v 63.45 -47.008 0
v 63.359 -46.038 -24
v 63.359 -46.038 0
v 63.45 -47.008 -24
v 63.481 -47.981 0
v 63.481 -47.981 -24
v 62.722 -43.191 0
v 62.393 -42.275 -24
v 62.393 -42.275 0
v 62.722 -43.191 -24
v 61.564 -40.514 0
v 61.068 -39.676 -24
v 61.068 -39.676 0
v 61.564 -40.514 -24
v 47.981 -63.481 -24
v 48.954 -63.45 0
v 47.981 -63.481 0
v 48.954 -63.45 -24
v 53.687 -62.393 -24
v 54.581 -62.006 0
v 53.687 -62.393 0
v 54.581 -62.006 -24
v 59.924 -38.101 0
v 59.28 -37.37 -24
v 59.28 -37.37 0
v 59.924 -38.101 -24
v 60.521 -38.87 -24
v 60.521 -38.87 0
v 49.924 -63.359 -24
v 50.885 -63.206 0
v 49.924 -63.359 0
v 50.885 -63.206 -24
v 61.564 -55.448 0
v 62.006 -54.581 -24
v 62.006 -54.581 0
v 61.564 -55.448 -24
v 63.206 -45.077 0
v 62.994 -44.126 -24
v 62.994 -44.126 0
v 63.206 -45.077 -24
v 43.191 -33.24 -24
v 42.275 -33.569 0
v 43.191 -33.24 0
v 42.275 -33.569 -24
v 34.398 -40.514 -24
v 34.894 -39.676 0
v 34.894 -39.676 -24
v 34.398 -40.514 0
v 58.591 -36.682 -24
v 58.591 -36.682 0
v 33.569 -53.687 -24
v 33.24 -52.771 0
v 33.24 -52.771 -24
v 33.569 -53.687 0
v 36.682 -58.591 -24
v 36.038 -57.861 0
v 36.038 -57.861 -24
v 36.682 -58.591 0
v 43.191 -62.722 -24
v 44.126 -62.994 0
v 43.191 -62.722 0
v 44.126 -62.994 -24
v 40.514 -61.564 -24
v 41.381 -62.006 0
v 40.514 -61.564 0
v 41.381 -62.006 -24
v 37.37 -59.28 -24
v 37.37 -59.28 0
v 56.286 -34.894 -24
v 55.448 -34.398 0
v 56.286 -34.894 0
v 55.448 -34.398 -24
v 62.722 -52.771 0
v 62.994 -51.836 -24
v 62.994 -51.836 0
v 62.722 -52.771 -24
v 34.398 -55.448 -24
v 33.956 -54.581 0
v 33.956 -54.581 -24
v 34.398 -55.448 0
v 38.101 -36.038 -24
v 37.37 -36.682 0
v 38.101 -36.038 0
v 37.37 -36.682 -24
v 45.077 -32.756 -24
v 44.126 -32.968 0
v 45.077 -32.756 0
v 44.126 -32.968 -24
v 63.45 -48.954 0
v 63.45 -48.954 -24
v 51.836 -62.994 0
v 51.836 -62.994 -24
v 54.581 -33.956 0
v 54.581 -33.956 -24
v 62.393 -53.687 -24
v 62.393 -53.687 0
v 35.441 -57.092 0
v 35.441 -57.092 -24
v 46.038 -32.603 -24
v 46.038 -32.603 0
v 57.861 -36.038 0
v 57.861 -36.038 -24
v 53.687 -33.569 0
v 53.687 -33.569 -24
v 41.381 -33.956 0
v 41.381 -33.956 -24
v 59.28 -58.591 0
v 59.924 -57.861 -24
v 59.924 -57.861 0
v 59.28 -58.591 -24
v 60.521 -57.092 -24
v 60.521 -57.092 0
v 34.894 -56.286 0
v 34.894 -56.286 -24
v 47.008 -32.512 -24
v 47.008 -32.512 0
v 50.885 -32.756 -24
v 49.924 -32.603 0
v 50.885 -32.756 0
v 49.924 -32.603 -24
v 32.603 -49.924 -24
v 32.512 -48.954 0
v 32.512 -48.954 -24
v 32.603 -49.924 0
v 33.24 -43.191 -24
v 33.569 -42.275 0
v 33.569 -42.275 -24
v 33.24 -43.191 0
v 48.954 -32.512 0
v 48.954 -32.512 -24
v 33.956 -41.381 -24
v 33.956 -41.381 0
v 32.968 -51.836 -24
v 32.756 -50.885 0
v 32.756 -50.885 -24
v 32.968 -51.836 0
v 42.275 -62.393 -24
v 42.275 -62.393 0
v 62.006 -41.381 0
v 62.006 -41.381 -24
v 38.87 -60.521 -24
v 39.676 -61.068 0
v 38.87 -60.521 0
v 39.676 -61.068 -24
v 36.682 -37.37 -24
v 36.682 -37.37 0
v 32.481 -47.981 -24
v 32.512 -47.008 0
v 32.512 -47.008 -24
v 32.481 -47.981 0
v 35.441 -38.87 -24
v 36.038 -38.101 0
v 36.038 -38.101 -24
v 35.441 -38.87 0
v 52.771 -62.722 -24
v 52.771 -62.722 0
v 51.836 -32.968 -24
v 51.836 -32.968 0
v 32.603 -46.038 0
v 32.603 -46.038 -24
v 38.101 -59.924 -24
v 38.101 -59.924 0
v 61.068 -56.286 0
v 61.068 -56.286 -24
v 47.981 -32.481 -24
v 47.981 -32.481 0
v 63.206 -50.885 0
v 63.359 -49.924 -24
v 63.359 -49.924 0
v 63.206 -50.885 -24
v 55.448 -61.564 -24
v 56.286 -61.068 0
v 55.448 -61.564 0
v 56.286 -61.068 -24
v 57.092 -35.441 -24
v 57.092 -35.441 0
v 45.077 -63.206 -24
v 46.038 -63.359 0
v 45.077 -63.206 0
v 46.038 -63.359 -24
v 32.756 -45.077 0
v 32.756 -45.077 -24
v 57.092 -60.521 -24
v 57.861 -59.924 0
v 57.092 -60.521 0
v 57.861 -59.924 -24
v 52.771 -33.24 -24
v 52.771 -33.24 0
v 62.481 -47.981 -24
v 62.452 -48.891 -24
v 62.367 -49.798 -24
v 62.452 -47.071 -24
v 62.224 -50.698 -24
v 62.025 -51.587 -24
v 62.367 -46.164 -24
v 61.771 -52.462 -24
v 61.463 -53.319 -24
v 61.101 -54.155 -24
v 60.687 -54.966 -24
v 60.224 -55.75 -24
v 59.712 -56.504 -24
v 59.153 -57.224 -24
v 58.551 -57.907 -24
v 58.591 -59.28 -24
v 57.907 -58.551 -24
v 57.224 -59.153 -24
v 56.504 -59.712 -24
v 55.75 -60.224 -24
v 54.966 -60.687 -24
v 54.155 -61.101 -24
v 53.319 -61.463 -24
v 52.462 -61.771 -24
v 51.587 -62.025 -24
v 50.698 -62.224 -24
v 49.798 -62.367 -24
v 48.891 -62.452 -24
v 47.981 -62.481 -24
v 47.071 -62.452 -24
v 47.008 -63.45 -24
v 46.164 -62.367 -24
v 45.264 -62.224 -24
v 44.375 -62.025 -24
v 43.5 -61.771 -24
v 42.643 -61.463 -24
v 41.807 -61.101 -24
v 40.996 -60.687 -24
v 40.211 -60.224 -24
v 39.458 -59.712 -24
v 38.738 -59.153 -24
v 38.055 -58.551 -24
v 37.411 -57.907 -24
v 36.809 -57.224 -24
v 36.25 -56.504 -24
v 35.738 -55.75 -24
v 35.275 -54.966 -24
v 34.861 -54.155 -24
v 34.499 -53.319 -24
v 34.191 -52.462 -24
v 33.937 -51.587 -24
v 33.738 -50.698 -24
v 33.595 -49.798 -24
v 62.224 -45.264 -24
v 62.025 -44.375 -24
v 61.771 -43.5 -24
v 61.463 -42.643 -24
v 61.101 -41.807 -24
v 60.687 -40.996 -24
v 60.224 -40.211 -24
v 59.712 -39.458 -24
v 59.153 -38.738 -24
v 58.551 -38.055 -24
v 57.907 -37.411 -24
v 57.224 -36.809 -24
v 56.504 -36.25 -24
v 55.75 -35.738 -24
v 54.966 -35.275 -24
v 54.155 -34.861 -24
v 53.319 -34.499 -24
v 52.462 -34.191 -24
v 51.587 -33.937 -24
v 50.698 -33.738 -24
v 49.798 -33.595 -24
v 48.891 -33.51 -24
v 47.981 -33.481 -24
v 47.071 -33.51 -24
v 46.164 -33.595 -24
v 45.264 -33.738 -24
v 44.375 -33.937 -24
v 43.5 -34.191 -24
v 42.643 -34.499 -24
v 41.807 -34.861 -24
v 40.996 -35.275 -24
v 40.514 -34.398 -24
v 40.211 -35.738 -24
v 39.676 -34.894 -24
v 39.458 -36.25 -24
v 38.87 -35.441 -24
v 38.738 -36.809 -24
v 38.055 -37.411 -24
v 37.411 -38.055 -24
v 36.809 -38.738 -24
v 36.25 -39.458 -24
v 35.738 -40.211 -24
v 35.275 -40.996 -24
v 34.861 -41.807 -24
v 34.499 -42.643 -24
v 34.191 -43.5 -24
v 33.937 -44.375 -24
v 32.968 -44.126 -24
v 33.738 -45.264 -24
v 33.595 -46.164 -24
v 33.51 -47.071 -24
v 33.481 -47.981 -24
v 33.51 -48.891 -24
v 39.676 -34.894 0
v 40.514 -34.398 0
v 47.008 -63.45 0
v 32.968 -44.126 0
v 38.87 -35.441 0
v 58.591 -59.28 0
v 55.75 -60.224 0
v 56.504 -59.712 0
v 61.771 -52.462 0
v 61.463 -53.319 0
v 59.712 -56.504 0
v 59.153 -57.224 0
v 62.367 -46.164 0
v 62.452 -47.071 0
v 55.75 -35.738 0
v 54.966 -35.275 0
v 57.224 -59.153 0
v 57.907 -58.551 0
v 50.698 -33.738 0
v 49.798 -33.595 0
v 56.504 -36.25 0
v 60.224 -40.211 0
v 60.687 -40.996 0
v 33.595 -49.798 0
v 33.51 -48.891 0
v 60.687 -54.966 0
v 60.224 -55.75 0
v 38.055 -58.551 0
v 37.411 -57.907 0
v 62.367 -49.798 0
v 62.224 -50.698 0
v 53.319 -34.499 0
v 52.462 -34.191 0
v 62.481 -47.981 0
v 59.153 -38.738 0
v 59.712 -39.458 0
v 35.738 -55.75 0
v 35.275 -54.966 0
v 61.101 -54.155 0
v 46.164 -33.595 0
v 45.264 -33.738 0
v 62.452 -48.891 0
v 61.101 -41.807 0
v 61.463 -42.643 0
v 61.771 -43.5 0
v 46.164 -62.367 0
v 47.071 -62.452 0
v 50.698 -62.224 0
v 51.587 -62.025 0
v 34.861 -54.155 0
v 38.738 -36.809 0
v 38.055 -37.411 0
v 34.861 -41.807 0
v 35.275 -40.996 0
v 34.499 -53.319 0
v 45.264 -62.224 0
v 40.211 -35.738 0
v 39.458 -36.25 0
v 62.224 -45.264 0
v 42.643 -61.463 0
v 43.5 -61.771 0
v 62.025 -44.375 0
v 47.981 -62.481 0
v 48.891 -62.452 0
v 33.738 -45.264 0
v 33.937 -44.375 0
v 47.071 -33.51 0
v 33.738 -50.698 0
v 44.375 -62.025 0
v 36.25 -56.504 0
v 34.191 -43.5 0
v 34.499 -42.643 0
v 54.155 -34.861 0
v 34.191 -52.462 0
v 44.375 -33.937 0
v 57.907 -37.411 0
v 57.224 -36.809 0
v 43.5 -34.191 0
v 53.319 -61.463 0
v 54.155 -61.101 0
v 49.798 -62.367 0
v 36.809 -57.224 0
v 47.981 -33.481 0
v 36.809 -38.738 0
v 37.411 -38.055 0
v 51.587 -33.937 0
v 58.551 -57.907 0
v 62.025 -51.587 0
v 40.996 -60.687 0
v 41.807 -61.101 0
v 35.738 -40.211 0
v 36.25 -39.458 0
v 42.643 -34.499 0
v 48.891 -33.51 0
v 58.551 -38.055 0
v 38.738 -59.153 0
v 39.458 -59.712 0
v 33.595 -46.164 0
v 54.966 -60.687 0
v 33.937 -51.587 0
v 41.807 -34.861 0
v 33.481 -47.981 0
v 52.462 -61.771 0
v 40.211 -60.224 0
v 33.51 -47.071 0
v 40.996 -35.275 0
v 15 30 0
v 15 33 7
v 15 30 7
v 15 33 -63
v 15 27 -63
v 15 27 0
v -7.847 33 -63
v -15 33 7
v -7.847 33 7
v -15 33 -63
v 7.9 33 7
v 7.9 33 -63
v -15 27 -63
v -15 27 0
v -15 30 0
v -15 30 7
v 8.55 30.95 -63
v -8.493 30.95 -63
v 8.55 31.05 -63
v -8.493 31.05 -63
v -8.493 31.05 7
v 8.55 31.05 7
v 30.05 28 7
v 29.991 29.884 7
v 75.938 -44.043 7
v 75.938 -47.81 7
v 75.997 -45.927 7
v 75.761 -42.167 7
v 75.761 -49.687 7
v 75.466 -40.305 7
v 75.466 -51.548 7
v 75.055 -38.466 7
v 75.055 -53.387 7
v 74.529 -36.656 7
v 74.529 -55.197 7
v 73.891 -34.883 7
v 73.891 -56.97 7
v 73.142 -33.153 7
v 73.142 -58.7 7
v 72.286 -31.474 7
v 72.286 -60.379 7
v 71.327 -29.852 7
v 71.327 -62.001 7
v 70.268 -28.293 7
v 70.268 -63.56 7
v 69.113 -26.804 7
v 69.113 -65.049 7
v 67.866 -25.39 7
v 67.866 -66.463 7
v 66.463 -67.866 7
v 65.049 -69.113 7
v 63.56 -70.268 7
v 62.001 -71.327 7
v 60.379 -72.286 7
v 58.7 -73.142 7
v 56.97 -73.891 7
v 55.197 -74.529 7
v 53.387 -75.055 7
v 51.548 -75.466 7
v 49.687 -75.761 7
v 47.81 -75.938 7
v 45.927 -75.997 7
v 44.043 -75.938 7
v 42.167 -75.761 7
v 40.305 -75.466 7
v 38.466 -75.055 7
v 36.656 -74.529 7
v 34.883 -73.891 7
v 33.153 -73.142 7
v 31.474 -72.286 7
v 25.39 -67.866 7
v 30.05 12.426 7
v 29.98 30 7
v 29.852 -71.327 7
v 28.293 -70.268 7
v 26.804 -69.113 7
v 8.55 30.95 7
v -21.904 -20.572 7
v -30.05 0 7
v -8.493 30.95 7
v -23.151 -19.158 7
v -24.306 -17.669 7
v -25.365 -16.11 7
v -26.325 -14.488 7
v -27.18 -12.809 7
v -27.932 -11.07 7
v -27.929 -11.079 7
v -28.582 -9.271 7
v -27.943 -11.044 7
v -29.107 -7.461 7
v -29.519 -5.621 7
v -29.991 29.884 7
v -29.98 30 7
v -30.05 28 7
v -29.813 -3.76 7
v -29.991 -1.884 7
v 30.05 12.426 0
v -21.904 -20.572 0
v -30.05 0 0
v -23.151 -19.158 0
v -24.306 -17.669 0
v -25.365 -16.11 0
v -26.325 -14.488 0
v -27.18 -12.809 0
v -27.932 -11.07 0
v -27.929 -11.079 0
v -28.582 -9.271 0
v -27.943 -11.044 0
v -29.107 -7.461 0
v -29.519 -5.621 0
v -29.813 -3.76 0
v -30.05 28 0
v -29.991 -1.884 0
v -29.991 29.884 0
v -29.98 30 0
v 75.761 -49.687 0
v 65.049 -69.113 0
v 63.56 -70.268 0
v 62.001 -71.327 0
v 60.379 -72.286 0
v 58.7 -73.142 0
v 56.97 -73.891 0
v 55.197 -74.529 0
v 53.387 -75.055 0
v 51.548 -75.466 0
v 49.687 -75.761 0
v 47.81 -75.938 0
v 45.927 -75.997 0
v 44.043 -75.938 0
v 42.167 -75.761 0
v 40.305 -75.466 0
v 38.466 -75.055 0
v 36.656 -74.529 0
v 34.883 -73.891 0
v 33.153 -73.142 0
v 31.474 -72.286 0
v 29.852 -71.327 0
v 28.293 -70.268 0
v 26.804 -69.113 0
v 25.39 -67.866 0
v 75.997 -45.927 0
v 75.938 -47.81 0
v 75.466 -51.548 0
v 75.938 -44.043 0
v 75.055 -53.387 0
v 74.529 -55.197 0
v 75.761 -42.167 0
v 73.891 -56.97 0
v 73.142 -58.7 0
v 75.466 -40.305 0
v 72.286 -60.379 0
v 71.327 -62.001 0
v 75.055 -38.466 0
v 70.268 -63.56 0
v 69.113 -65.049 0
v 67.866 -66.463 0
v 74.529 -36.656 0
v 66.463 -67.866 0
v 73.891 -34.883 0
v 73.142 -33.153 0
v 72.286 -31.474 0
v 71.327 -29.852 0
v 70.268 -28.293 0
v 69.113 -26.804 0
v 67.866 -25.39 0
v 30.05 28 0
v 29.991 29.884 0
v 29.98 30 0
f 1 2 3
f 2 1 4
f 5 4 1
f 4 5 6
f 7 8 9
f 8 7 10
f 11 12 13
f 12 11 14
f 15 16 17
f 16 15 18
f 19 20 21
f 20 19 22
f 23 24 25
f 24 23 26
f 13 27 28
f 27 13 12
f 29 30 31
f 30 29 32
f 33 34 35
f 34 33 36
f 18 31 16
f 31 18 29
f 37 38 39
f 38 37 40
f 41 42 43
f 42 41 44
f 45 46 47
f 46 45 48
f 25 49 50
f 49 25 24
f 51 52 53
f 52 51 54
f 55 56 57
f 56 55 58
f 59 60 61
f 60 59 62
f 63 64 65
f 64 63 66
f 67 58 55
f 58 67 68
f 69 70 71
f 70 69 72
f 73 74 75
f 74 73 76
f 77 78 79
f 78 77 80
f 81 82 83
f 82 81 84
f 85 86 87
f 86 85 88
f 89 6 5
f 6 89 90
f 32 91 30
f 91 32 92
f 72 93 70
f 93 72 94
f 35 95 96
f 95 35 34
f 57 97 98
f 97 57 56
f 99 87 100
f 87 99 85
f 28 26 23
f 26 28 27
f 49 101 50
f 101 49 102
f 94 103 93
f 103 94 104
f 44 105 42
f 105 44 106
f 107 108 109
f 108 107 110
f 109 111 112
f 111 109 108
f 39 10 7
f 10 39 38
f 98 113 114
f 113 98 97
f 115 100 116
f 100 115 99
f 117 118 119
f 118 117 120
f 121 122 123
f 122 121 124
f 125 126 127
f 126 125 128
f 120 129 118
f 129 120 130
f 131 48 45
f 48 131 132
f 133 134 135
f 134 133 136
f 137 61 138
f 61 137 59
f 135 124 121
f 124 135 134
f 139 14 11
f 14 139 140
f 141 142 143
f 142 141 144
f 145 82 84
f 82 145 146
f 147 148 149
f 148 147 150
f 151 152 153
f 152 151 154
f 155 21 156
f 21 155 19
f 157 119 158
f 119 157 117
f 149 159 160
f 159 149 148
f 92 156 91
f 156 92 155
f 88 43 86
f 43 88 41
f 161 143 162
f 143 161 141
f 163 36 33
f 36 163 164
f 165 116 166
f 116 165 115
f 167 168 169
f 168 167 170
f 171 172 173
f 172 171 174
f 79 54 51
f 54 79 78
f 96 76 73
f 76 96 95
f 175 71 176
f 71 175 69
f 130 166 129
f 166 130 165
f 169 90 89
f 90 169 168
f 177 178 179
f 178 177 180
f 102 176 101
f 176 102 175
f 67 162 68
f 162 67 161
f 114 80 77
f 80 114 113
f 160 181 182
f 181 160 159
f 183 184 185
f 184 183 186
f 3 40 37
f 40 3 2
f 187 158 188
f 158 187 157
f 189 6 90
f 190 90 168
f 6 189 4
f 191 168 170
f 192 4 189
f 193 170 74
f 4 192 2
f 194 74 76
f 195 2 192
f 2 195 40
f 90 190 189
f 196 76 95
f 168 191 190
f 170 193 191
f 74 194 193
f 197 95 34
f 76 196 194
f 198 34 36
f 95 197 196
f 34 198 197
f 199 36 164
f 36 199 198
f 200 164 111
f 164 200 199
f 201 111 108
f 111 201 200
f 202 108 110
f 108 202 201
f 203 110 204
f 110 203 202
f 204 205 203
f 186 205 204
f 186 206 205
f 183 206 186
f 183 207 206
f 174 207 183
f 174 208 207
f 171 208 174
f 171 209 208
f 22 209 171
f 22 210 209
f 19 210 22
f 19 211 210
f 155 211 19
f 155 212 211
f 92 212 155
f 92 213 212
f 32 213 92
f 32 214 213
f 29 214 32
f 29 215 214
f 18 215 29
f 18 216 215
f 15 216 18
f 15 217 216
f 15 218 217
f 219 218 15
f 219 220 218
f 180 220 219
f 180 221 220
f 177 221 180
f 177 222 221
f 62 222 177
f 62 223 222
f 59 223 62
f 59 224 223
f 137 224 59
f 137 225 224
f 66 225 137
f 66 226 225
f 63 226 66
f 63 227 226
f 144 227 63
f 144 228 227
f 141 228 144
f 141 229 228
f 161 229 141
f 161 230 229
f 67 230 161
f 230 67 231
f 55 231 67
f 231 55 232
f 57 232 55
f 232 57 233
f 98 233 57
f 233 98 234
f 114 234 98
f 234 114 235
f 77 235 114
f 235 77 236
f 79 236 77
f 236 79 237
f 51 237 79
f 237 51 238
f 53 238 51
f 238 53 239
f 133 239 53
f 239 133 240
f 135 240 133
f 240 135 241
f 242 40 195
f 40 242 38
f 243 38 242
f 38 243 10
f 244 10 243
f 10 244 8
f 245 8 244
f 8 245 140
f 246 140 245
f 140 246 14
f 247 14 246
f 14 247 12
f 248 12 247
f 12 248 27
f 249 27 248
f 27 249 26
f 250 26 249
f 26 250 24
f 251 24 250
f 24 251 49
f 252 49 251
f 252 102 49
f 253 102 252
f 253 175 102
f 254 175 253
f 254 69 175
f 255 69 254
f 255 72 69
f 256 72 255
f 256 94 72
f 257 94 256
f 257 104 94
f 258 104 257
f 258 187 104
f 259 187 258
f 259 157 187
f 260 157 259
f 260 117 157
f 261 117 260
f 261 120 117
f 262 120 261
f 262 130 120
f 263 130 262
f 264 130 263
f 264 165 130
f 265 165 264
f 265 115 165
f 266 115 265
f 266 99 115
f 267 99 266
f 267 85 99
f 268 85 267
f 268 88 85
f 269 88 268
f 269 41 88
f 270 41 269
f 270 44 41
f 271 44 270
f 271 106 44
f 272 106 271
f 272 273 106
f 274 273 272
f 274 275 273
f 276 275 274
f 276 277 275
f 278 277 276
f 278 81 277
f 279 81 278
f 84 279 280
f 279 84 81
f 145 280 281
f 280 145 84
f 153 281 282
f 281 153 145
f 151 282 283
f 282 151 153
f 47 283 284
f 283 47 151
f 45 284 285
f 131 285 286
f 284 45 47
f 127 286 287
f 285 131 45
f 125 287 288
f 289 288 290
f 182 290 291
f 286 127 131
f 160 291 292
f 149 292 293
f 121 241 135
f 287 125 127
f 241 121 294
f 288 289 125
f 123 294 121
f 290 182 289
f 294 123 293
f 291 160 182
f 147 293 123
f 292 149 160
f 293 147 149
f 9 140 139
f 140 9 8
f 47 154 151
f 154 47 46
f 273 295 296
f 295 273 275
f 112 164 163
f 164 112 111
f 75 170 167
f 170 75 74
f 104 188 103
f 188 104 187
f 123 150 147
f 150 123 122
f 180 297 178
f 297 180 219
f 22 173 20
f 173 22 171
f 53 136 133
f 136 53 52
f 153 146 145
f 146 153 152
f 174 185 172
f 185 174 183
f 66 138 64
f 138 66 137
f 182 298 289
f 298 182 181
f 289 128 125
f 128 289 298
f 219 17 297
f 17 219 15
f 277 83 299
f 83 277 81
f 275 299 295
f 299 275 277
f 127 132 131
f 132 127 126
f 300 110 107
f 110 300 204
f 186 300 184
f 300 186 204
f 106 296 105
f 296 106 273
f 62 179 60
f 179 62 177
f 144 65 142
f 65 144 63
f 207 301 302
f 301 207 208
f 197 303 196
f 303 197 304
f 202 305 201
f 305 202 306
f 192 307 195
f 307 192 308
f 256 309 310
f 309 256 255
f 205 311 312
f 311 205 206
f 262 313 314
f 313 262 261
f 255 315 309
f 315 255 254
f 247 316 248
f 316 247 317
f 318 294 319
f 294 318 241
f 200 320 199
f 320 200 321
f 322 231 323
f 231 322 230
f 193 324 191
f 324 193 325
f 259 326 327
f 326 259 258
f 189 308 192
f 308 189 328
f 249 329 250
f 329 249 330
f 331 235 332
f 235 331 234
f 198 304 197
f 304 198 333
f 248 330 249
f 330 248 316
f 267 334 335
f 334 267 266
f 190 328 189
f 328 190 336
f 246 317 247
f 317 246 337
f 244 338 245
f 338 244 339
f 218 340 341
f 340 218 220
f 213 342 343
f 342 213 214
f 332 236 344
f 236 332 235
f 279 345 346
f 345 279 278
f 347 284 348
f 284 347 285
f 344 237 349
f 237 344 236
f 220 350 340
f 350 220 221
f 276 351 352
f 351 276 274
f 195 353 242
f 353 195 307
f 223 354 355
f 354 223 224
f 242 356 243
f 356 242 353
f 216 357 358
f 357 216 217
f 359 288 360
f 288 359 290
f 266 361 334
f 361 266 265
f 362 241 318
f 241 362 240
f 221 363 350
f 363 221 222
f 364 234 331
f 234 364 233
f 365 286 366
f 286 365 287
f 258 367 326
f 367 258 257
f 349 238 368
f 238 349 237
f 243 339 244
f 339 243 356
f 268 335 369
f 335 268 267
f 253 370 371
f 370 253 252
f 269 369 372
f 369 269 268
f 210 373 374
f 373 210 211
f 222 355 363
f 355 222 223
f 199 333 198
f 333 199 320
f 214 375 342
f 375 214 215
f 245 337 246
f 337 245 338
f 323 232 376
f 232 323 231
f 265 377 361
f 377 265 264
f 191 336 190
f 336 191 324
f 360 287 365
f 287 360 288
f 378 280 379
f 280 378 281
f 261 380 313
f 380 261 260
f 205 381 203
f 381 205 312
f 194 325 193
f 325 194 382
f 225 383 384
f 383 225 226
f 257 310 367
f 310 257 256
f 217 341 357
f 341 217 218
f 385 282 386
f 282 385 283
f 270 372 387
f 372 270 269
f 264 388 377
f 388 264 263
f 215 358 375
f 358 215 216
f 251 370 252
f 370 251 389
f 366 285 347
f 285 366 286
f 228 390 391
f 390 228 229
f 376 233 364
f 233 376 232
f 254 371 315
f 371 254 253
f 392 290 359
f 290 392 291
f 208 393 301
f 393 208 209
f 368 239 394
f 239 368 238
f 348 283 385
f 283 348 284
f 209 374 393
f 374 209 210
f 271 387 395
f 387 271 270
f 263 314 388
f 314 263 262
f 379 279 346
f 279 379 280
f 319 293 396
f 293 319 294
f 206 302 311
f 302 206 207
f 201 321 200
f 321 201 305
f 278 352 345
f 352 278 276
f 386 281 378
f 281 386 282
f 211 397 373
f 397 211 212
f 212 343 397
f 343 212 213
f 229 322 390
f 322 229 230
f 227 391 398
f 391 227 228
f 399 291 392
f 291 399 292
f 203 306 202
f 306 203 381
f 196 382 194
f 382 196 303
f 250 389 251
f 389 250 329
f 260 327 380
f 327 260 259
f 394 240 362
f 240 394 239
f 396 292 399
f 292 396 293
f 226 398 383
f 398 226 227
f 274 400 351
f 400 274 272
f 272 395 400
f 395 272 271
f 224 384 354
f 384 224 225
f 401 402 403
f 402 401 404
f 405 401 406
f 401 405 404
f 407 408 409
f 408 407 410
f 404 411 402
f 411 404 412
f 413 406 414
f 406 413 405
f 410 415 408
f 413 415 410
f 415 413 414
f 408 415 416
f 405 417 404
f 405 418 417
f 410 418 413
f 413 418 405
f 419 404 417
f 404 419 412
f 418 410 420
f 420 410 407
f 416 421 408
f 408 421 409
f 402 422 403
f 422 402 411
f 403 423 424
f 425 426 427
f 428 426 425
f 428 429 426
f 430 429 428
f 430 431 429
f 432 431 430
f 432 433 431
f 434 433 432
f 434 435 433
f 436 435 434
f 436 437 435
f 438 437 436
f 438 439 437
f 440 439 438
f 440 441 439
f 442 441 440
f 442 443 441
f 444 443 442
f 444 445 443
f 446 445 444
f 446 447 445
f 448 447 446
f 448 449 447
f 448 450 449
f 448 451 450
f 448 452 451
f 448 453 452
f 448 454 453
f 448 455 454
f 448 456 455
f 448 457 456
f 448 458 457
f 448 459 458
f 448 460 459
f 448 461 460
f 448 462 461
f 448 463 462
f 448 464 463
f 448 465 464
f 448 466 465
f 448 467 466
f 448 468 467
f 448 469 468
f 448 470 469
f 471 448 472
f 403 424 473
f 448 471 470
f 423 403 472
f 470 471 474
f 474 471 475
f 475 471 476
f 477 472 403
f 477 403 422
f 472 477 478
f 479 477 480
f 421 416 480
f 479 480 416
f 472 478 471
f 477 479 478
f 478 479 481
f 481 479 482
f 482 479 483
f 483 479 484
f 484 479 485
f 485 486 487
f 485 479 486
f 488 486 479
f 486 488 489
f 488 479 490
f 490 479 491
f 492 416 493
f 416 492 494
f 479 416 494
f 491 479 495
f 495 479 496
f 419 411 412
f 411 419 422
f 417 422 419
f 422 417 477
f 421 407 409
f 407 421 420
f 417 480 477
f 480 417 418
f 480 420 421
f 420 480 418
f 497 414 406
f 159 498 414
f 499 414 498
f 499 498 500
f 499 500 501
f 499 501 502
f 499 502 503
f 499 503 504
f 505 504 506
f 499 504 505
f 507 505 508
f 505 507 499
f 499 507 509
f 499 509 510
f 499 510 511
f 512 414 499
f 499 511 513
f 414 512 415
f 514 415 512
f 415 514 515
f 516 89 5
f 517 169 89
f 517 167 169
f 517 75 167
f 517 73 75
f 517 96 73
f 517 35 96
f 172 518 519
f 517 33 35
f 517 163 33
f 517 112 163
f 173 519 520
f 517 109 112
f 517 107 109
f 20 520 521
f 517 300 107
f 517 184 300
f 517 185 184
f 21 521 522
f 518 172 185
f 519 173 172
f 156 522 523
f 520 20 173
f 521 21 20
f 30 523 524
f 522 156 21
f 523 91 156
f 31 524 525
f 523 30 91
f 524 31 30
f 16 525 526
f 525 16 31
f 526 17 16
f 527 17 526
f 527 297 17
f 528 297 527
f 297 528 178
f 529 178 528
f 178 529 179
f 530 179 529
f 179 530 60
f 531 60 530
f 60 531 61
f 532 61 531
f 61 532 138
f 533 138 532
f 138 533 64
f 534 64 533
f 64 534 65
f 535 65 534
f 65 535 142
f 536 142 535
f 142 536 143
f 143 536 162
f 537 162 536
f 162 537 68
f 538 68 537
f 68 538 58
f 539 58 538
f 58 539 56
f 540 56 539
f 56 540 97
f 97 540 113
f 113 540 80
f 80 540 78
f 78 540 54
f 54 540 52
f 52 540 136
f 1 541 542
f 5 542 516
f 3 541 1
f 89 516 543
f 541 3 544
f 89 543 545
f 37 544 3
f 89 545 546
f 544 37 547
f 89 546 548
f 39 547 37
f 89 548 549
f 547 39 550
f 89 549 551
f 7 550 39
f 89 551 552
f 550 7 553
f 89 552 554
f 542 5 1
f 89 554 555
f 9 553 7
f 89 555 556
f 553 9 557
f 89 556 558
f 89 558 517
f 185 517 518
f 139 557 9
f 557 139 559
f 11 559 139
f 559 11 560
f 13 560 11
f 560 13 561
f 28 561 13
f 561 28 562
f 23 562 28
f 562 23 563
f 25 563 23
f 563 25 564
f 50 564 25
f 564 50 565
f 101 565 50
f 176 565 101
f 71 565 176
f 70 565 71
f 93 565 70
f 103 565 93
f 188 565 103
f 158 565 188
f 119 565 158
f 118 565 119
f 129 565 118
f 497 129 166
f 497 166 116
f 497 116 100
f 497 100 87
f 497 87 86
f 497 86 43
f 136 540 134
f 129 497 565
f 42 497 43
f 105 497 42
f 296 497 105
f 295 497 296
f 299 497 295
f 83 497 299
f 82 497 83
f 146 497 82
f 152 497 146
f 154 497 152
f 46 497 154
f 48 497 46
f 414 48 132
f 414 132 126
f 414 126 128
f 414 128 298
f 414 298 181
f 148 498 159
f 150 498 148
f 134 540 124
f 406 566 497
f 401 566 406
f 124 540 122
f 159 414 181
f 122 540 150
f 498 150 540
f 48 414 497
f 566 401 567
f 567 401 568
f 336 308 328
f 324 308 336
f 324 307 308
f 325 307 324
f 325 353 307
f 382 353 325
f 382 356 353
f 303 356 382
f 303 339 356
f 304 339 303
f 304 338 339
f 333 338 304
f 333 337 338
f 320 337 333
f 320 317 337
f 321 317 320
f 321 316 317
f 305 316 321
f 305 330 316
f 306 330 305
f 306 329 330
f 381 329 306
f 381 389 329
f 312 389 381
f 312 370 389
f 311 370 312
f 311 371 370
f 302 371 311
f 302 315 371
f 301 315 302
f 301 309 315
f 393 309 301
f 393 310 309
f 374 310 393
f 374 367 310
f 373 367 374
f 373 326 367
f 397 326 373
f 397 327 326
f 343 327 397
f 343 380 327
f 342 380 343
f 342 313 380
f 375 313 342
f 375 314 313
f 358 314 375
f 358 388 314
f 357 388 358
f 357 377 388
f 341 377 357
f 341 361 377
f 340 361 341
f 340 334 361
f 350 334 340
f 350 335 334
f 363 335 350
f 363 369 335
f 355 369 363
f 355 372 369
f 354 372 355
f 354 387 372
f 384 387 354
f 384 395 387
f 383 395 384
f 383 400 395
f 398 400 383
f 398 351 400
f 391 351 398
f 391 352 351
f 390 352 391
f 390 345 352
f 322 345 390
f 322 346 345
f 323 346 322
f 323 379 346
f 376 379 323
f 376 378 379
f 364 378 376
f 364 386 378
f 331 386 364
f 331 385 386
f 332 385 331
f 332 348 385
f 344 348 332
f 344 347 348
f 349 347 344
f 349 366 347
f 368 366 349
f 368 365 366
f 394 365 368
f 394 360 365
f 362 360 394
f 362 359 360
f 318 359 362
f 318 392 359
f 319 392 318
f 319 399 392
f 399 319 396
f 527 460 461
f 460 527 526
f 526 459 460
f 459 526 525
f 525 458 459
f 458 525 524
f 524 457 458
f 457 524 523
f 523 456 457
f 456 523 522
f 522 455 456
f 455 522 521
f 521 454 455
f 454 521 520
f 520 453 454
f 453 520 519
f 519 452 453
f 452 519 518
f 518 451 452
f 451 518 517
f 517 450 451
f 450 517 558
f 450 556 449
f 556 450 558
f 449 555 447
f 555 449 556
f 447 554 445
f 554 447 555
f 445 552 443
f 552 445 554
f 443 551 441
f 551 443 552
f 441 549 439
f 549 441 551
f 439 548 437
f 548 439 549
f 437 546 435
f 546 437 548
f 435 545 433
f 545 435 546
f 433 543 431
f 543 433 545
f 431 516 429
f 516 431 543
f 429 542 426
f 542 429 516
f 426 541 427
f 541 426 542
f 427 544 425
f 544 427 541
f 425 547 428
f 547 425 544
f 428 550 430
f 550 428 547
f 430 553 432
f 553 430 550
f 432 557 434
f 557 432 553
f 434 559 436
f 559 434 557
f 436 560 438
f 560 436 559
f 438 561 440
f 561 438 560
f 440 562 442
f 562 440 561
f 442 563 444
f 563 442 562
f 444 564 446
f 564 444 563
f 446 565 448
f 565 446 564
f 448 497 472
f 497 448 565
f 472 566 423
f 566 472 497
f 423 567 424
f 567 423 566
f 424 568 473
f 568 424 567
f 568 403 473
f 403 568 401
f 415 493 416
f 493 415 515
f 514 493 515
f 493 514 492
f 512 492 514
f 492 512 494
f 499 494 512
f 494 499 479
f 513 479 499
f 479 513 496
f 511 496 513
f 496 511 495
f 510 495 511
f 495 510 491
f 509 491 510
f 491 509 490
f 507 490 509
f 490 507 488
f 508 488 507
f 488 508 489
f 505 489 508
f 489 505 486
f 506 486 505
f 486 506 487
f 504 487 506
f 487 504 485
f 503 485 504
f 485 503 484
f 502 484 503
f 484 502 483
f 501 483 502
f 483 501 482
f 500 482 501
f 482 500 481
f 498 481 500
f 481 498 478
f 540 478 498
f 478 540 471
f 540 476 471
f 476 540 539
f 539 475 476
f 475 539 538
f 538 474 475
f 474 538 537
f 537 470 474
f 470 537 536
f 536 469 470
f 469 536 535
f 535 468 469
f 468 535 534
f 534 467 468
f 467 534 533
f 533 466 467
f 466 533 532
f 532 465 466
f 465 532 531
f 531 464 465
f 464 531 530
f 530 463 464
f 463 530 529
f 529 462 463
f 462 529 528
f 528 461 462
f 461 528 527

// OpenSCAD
//Parte donde se apoya el rollo
translate([25+(65/2)*cos(45),-(65/2)*sin(45)-25,-(26)+2])
difference(){
cylinder(d=31,$fn=100,h=26);
cylinder(d=31-2,$fn=100,h=26);

}


//apoyo
translate([0,30,-28])
rotate([-90,0,0])
difference(){
cube([30,70,6],center=true);
//recortador
    translate([0,0,1])
minkowski(){
    cube([0.1,70,0.1],center=true);
    //se agregaron 4 mm a la altura del acople 
    //Se garego 2mm a d1
    //se agrego 0mm a d2
cylinder(d1=15+2,d2=13,h=2+4,fn=100);
    
}
}//fin diferencia

linear_extrude(height=7)
difference(){
    
//figura
minkowski(){
//trayectoria
union(){
    translate([0,14])
square([0.1,28],center=true);
//pieza45grados
translate([(65/2)*cos(45),-(65/2)*sin(45)])
rotate(45)
square([0.1,65],center=true);
}
//redondeador
circle(r=30,$fn=100);

}

//cuadrado recortador
translate([-30,30])
square([60,30]);

}
